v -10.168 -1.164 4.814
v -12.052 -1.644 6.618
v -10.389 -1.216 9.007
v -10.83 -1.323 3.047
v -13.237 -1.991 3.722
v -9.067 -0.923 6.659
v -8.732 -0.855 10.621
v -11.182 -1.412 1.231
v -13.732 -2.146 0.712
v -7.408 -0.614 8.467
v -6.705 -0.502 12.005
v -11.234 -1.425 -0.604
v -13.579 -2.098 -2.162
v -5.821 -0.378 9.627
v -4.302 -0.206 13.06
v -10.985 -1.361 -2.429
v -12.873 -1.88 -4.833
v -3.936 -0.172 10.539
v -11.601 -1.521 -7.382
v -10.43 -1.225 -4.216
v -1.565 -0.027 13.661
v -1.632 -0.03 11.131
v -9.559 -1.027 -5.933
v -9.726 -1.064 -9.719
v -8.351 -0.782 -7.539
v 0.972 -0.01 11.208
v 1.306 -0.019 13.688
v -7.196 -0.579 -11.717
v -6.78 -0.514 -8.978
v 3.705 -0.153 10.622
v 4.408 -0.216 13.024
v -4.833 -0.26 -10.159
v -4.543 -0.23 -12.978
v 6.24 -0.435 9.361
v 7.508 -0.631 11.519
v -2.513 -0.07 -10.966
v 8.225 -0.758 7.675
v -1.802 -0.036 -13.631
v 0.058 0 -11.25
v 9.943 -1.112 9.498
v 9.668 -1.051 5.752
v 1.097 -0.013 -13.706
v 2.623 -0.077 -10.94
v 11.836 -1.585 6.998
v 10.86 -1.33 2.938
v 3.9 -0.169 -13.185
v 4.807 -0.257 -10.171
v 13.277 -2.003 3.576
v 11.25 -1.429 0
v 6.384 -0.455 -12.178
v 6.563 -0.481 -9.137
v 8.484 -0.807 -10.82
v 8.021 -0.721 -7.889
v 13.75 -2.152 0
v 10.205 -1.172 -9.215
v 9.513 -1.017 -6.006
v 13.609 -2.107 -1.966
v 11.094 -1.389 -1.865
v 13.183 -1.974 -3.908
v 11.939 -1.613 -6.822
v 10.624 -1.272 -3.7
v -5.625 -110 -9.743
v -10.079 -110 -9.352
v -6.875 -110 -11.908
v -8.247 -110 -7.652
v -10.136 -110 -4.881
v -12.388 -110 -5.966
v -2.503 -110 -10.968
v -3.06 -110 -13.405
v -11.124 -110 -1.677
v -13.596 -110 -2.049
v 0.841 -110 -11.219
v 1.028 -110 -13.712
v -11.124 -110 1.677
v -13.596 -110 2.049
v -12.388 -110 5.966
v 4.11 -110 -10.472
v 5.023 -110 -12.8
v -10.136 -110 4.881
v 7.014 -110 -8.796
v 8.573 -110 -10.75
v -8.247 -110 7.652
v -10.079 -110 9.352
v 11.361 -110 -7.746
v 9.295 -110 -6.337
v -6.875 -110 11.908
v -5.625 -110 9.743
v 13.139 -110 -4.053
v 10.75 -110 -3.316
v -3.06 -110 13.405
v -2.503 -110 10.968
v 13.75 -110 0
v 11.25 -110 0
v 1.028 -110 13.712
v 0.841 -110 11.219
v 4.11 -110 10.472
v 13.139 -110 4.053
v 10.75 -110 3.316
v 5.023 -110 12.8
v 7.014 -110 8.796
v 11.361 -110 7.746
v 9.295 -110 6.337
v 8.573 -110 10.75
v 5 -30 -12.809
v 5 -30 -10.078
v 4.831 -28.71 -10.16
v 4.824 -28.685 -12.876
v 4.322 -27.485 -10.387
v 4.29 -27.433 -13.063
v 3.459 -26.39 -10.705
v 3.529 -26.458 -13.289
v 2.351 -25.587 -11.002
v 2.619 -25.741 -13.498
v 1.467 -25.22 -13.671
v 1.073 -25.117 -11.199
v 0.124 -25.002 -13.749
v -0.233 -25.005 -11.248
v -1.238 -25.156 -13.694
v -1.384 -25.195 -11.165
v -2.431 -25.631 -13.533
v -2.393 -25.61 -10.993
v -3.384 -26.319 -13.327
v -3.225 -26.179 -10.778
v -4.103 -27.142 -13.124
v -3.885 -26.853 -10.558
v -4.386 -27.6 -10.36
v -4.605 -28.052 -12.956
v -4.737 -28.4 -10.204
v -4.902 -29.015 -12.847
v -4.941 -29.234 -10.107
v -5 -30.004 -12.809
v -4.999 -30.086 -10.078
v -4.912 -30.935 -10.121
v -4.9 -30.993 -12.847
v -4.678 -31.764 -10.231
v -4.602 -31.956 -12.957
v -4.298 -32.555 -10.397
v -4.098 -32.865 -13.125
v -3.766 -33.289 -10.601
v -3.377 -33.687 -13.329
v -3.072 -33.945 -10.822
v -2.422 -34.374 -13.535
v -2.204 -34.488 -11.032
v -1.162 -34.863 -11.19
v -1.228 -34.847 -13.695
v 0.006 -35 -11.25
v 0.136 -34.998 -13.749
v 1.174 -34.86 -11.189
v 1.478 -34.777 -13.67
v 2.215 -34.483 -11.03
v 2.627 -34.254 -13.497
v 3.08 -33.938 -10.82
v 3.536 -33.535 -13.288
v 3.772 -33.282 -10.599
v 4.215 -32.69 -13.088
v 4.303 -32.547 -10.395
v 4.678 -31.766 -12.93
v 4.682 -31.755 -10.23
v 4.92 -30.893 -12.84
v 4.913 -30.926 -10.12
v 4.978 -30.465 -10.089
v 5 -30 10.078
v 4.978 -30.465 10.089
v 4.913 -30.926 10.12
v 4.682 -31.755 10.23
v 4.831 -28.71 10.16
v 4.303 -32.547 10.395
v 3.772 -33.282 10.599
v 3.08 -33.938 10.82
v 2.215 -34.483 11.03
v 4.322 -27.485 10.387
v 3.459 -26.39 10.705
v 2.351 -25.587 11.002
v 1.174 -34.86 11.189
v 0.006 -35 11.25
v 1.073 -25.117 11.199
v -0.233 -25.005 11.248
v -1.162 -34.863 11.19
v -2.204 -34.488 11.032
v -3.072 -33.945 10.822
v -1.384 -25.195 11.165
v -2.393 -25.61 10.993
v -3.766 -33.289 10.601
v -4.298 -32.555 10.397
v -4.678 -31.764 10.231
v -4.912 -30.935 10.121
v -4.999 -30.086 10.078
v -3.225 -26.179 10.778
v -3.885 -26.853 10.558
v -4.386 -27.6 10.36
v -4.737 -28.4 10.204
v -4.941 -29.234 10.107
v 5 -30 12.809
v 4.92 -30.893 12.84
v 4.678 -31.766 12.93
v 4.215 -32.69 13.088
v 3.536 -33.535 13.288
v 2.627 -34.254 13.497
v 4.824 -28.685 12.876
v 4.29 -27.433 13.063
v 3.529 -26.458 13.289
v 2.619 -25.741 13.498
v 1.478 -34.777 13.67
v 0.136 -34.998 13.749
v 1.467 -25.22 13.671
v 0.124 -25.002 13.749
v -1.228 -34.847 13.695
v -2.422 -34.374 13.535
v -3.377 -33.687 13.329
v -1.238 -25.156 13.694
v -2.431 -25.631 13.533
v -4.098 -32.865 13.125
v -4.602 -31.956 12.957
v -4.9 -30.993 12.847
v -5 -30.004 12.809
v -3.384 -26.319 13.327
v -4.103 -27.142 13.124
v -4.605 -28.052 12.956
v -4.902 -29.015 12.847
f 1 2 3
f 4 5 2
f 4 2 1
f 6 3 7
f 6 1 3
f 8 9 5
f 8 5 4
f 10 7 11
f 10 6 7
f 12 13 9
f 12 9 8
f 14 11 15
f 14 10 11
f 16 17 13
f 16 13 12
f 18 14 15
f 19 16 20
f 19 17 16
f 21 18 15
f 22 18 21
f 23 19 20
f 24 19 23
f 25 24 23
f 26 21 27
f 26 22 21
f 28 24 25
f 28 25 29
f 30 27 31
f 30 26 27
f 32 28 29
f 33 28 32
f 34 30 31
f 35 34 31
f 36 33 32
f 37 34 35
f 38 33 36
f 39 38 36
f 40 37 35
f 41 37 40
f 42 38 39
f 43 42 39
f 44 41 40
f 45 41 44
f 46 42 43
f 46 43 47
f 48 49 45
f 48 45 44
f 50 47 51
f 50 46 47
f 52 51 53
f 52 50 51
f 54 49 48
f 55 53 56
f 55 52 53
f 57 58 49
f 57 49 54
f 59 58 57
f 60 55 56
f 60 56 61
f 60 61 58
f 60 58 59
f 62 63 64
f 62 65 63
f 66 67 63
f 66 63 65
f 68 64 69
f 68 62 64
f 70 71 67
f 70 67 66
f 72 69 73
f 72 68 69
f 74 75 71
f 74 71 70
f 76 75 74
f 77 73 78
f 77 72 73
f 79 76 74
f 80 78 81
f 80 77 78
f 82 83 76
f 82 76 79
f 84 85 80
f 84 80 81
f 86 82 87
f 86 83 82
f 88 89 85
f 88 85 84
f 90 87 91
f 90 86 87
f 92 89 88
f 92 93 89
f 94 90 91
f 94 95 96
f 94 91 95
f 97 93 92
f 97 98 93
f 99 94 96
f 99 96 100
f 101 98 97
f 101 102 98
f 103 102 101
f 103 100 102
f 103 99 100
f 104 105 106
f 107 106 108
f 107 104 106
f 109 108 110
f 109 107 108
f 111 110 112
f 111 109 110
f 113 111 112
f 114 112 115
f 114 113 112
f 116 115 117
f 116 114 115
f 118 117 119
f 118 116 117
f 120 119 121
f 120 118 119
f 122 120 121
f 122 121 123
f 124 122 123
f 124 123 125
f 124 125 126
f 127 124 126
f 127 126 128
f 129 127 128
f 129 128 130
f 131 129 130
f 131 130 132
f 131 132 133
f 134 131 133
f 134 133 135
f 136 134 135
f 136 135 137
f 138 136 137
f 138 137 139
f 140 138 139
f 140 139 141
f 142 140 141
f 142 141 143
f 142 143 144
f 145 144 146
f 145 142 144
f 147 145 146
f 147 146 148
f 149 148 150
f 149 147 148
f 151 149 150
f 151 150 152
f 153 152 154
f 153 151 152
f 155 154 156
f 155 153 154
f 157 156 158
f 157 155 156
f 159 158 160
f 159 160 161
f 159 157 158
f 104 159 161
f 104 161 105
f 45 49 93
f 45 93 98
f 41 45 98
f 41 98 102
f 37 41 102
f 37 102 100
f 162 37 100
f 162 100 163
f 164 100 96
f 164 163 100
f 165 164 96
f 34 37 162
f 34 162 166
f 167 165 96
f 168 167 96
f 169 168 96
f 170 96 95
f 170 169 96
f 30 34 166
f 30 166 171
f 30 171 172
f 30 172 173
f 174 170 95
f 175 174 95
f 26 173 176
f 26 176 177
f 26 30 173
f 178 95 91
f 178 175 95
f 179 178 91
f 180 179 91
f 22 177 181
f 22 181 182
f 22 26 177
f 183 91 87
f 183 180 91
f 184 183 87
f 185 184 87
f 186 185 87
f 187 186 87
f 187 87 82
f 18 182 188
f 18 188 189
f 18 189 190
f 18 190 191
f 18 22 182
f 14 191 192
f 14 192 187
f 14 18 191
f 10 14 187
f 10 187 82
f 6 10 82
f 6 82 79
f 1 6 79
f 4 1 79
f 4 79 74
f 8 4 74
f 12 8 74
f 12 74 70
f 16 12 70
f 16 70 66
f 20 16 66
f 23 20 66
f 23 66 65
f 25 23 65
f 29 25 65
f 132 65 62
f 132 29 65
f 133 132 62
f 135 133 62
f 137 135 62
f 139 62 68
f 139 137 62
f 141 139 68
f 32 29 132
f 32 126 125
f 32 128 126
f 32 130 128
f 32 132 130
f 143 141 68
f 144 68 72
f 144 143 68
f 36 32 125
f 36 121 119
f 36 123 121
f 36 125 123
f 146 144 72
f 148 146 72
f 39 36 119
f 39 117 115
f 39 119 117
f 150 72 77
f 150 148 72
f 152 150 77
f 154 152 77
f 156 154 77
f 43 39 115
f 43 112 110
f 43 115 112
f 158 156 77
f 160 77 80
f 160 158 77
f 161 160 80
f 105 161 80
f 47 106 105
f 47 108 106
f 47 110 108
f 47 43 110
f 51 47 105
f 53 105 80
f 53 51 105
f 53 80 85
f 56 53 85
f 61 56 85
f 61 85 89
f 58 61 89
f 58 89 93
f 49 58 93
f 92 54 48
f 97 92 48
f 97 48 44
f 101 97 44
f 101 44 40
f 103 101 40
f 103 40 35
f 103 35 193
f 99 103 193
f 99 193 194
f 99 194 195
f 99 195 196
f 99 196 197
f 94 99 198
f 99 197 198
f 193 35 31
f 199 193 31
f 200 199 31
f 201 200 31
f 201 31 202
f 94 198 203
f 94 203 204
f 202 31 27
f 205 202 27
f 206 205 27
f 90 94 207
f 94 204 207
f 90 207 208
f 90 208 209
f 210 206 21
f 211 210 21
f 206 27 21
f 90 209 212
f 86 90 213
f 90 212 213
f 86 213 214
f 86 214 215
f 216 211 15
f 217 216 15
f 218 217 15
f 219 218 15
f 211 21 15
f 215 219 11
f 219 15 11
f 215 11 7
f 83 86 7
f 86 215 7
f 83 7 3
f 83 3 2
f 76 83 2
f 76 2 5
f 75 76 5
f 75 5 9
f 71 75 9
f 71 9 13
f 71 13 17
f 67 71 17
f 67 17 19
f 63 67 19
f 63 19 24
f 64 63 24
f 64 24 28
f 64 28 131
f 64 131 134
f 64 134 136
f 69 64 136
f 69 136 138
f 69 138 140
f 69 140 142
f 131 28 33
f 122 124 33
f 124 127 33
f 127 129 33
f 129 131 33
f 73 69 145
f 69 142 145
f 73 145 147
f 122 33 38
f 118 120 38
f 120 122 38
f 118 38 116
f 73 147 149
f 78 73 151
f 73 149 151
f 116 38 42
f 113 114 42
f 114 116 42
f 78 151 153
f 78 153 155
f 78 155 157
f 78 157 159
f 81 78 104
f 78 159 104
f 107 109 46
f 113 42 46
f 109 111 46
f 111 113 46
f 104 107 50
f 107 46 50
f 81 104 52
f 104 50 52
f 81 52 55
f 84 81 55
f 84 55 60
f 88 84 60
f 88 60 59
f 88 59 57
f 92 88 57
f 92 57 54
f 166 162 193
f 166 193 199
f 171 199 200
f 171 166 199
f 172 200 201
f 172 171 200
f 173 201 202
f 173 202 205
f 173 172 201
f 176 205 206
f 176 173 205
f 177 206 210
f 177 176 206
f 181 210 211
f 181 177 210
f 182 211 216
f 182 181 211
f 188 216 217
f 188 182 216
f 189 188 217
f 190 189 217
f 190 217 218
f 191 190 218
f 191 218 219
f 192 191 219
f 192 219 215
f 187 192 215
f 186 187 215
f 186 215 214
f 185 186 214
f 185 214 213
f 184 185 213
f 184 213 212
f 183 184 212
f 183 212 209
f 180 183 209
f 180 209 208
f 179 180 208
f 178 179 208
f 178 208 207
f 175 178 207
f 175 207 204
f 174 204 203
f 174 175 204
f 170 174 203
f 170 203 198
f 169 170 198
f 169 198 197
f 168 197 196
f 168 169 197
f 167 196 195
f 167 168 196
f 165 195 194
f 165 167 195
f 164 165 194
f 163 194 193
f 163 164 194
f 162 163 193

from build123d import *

# Parameters (mm, degrees)
F0_R     = 13.75
F0_R_2   = 11.25
F1_DEPTH = 110
F4_R     = 5
F5_DEPTH = 33.751
F6_DEPTH = 33.751


with BuildPart() as f1:
    # F0 (on Front) → F1 (new body)
    with BuildSketch(Plane.XZ):
        Circle(F0_R)
        Circle(F0_R_2, mode=Mode.SUBTRACT)
    extrude(amount=F1_DEPTH)

    # F4 (on offset) → F5 (cut, through all)
    with BuildSketch(Plane.XY.offset(-20)):
        with Locations((0, -30)):
            Circle(F4_R)
    extrude(amount=F5_DEPTH, mode=Mode.SUBTRACT)

    # F4 (on offset) → F6 (cut, through all)
    with BuildSketch(Plane.XY.offset(-20)):
        with BuildLine():
            Line((-21.2415, 7.674746), (-21.2415, -2.517288))
            Line((-21.2415, -2.517288), (-21.2415, -5.328869))
            ThreePointArc((-21.2415, -5.328869), (0.089579, -8.9e-05), (21.399274, -5.413752))
            Line((21.399274, -5.413752), (21.399274, -2.555365))
            Line((21.399274, -2.555365), (21.399274, 6.795851))
            Line((21.399274, 6.795851), (-21.2415, 7.674746))
        make_face()
    extrude(amount=F6_DEPTH, mode=Mode.SUBTRACT)


solid = f1.part
